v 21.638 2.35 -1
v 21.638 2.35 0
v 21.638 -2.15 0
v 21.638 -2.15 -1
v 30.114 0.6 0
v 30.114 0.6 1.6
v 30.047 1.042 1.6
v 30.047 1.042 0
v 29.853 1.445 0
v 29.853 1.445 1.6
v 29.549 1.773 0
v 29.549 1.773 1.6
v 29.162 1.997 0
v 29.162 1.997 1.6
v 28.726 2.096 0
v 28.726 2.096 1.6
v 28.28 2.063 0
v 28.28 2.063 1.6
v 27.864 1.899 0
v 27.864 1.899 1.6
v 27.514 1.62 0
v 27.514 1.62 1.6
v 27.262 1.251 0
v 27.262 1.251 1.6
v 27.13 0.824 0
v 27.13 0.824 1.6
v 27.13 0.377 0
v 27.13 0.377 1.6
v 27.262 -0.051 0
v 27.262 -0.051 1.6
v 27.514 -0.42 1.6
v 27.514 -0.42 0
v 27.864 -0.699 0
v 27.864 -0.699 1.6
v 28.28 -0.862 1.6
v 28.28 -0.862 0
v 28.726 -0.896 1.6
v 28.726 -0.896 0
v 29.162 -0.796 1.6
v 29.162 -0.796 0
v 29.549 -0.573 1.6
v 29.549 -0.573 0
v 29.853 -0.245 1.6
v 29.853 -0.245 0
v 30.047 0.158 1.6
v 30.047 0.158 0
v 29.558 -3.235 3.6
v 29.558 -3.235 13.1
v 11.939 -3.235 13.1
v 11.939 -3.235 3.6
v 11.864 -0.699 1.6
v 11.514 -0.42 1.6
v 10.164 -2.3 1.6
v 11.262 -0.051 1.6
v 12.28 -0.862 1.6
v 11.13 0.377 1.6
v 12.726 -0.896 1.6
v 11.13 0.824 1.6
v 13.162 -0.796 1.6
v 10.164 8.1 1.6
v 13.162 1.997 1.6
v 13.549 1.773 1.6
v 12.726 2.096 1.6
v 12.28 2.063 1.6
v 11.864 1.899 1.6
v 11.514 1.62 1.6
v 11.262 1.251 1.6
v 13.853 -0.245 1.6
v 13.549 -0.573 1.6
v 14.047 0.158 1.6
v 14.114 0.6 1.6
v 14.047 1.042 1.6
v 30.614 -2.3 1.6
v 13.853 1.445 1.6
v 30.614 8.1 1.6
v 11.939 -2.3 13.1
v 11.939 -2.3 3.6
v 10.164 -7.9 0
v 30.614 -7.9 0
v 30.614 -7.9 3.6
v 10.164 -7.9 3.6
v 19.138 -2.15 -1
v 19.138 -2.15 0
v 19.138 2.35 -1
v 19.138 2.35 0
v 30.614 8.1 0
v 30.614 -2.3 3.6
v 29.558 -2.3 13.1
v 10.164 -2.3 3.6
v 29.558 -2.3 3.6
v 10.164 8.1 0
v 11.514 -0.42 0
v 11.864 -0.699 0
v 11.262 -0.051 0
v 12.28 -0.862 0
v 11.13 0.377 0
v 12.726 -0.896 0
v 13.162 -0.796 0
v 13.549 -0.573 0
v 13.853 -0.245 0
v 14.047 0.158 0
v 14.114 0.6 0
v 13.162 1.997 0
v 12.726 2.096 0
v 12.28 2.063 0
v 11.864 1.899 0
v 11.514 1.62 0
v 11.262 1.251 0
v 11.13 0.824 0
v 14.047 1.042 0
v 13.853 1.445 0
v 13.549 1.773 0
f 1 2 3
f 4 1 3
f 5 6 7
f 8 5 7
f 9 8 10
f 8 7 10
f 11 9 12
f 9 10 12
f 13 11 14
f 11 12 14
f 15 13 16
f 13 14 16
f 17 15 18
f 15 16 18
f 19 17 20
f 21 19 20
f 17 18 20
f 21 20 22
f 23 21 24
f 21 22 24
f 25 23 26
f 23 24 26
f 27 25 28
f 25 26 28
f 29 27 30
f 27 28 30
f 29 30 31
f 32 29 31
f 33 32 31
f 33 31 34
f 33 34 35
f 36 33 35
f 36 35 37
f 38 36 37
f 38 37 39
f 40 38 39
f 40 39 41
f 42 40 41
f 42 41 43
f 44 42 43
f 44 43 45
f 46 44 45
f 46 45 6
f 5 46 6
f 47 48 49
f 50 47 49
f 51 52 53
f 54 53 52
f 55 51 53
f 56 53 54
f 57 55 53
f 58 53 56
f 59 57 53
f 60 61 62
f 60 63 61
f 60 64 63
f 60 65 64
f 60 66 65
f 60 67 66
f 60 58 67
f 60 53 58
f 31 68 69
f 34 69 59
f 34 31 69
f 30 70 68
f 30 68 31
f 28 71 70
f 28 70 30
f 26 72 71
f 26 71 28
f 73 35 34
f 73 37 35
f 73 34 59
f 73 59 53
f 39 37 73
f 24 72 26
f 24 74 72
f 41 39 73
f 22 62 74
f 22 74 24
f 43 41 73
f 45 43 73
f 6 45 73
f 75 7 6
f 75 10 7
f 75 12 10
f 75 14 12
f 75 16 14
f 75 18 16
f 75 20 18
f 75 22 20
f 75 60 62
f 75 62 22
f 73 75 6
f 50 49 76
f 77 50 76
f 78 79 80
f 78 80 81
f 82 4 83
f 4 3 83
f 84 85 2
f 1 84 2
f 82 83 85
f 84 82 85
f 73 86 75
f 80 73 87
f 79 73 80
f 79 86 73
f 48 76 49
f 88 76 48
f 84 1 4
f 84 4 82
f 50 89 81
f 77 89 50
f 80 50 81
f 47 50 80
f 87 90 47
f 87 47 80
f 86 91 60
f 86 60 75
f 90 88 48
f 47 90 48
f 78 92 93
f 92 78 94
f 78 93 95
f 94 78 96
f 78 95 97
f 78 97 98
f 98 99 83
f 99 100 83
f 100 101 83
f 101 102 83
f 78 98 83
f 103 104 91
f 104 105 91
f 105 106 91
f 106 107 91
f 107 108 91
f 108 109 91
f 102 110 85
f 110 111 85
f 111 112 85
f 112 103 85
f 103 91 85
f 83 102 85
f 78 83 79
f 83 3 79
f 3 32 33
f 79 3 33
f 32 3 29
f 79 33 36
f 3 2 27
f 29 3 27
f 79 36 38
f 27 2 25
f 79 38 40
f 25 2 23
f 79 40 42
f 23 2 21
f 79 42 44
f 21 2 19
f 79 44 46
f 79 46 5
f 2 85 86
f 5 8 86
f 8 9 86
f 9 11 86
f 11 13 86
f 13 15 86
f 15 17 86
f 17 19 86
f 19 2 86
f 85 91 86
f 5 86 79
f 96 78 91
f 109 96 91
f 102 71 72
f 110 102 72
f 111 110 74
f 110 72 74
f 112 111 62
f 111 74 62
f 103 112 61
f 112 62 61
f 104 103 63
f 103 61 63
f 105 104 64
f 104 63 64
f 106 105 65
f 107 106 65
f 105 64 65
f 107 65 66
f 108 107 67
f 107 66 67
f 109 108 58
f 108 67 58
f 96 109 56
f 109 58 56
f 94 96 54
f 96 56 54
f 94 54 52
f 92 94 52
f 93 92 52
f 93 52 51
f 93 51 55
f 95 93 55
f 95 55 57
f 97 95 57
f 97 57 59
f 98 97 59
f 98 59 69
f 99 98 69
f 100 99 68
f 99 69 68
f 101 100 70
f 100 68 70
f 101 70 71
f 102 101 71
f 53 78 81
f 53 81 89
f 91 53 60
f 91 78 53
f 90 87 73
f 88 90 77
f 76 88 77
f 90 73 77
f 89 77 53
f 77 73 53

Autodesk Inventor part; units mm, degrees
ref_plane "YZ Plane" through (0, 0, 0) normal (1, 0, 0) x (0, 1, 0)
ref_plane "XZ Plane" through (0, 0, 0) normal (0, 1, 0) x (-1, 0, 0)
ref_plane "XY Plane" through (0, 0, 0) normal (0, 0, 1) x (1, 0, 0)
sketch "Boceto1" plane through (0, 0, 0) normal (0, 0, 1) x (1, 0, 0)
  circle A0 centre (20.3885, 0.1002) radius 16.5 projected
  circle A1 centre (20.3885, 0.1002) radius 19.85 projected
  line L0 (10.1635, 8.1002) -> (30.6135, 8.1002)
  line L1 (30.6135, 8.1002) -> (30.6135, -7.8998)
  line L2 (30.6135, -7.8998) -> (10.1635, -7.8998)
  line L3 (10.1635, -7.8998) -> (10.1635, 8.1002)
  line L4 (10.1635, 8.1002) -> (30.6135, -7.8998) construction
  line L5 (30.6135, 8.1002) -> (10.1635, -7.8998) construction
  point P0 (0, 0)
  dimension "d0" = 20.45
  dimension "d1" = 16
extrude "Extrusión1" add sketch "Boceto1" along normal blind 1.6 contours L0 L1 L2 L3
sketch "Boceto2" plane through (0, 0, 1.6) normal (0, 0, 1) x (1, 0, 0)
  line L0 (10.1635, -7.8998) -> (30.6135, -7.8998) projected
  line L1 (30.6135, -7.8998) -> (30.6135, -2.2998)
  line L2 (30.6135, -7.8998) -> (30.6135, 8.1002) projected
  line L3 (30.6135, -2.2998) -> (10.1635, -2.2998)
  line L4 (10.1635, 8.1002) -> (10.1635, -7.8998) projected
  line L5 (10.1635, -7.8998) -> (10.1635, -2.2998)
  line L6 (30.6135, -7.8998) -> (10.1635, -7.8998)
  point P0 (0, 0)
  dimension "d4" = 5.6
extrude "Extrusión2" add sketch "Boceto2" along normal blind 11.5
sketch "Boceto3" plane through (0, 0, 13.1) normal (0, 0, 1) x (1, 0, 0)
  line L0 (30.6135, -2.2998) -> (10.1635, -2.2998) projected
  line L1 (11.9387, -2.2998) -> (10.1635, -2.2998)
  line L2 (10.1635, -2.2998) -> (10.1635, -7.8194)
  line L3 (10.1635, -7.8194) -> (30.6135, -7.8194)
  line L4 (30.6135, -7.8194) -> (30.6135, -2.2998)
  line L5 (30.6135, -2.2998) -> (29.5577, -2.2998)
  line L6 (29.5577, -3.2351) -> (11.9387, -3.2351)
  line L7 (11.9387, -3.2351) -> (11.9387, -2.2998)
  line L8 (29.5577, -2.2998) -> (29.5577, -3.2351)
  point P0 (0, 0)
extrude "Extrusión3" cut sketch "Boceto3" against normal blind 9.5 contours L4 L3 L2 L0 L7 L6 L8
sketch "Boceto4" plane through (0, 0, 13.1) normal (0, 0, 1) x (1, 0, 0)
  line L0 (30.6135, -7.8194) -> (10.1635, -7.8194) projected
  line L1 (10.1635, -7.8194) -> (10.1635, -7.8998) projected
  line L2 (10.1635, -7.8998) -> (30.6135, -7.8998) projected
  line L3 (30.6135, -7.8998) -> (30.6135, -7.8194) projected
  point P0 (0, 0)
extrude "Extrusión4" cut sketch "Boceto4" against normal blind 9.5
sketch "Boceto5" plane through (0, 0, 1.6) normal (0, 0, 1) x (1, 0, 0)
  circle A0 centre (28.6135, 0.6002) radius 1.5
  line L0 (28.6135, 0.6002) -> (12.6135, 0.6002) construction
  line L1 (28.6135, 0.6002) -> (44.6135, 0.6002) construction
  circle A1 centre (12.6135, 0.6002) radius 1.5
  point P0 (0, 0)
  point P1 (30.6135, 8.1002)
  dimension "d14" = 16
  dimension "d15" = 180
  dimension "d16" = 3
extrude "Extrusión5" cut sketch "Boceto5" against normal through all
sketch "Boceto6" plane through (0, 0, 0) normal (0, 0, -1) x (-1, 0, 0)
  line L0 (-10.1635, -7.8998) -> (-10.1635, 8.1002) construction
  line L1 (-30.6135, -7.8998) -> (-10.1635, -7.8998) construction
  line L2 (-10.1635, 8.1002) -> (-30.6135, -7.8998) construction
  line L3 (-30.6135, 8.1002) -> (-30.6135, -7.8998) construction
  line L4 (-10.1635, -7.8998) -> (-30.6135, 8.1002) construction
  line L5 (-19.1385, 2.3502) -> (-21.6385, 2.3502)
  line L6 (-21.6385, 2.3502) -> (-21.6385, -2.1498)
  line L7 (-21.6385, -2.1498) -> (-19.1385, -2.1498)
  line L8 (-19.1385, -2.1498) -> (-19.1385, 2.3502)
  line L9 (-19.1385, 2.3502) -> (-21.6385, -2.1498) construction
  line L10 (-21.6385, 2.3502) -> (-19.1385, -2.1498) construction
  point P0 (0, 0)
  point P1 (-20.3885, 0.1002)
  dimension "d19" = 2.5
  dimension "d20" = 4.5
extrude "Extrusión6" add sketch "Boceto6" along normal blind 1
properties part number "SensorCJMCU530"
